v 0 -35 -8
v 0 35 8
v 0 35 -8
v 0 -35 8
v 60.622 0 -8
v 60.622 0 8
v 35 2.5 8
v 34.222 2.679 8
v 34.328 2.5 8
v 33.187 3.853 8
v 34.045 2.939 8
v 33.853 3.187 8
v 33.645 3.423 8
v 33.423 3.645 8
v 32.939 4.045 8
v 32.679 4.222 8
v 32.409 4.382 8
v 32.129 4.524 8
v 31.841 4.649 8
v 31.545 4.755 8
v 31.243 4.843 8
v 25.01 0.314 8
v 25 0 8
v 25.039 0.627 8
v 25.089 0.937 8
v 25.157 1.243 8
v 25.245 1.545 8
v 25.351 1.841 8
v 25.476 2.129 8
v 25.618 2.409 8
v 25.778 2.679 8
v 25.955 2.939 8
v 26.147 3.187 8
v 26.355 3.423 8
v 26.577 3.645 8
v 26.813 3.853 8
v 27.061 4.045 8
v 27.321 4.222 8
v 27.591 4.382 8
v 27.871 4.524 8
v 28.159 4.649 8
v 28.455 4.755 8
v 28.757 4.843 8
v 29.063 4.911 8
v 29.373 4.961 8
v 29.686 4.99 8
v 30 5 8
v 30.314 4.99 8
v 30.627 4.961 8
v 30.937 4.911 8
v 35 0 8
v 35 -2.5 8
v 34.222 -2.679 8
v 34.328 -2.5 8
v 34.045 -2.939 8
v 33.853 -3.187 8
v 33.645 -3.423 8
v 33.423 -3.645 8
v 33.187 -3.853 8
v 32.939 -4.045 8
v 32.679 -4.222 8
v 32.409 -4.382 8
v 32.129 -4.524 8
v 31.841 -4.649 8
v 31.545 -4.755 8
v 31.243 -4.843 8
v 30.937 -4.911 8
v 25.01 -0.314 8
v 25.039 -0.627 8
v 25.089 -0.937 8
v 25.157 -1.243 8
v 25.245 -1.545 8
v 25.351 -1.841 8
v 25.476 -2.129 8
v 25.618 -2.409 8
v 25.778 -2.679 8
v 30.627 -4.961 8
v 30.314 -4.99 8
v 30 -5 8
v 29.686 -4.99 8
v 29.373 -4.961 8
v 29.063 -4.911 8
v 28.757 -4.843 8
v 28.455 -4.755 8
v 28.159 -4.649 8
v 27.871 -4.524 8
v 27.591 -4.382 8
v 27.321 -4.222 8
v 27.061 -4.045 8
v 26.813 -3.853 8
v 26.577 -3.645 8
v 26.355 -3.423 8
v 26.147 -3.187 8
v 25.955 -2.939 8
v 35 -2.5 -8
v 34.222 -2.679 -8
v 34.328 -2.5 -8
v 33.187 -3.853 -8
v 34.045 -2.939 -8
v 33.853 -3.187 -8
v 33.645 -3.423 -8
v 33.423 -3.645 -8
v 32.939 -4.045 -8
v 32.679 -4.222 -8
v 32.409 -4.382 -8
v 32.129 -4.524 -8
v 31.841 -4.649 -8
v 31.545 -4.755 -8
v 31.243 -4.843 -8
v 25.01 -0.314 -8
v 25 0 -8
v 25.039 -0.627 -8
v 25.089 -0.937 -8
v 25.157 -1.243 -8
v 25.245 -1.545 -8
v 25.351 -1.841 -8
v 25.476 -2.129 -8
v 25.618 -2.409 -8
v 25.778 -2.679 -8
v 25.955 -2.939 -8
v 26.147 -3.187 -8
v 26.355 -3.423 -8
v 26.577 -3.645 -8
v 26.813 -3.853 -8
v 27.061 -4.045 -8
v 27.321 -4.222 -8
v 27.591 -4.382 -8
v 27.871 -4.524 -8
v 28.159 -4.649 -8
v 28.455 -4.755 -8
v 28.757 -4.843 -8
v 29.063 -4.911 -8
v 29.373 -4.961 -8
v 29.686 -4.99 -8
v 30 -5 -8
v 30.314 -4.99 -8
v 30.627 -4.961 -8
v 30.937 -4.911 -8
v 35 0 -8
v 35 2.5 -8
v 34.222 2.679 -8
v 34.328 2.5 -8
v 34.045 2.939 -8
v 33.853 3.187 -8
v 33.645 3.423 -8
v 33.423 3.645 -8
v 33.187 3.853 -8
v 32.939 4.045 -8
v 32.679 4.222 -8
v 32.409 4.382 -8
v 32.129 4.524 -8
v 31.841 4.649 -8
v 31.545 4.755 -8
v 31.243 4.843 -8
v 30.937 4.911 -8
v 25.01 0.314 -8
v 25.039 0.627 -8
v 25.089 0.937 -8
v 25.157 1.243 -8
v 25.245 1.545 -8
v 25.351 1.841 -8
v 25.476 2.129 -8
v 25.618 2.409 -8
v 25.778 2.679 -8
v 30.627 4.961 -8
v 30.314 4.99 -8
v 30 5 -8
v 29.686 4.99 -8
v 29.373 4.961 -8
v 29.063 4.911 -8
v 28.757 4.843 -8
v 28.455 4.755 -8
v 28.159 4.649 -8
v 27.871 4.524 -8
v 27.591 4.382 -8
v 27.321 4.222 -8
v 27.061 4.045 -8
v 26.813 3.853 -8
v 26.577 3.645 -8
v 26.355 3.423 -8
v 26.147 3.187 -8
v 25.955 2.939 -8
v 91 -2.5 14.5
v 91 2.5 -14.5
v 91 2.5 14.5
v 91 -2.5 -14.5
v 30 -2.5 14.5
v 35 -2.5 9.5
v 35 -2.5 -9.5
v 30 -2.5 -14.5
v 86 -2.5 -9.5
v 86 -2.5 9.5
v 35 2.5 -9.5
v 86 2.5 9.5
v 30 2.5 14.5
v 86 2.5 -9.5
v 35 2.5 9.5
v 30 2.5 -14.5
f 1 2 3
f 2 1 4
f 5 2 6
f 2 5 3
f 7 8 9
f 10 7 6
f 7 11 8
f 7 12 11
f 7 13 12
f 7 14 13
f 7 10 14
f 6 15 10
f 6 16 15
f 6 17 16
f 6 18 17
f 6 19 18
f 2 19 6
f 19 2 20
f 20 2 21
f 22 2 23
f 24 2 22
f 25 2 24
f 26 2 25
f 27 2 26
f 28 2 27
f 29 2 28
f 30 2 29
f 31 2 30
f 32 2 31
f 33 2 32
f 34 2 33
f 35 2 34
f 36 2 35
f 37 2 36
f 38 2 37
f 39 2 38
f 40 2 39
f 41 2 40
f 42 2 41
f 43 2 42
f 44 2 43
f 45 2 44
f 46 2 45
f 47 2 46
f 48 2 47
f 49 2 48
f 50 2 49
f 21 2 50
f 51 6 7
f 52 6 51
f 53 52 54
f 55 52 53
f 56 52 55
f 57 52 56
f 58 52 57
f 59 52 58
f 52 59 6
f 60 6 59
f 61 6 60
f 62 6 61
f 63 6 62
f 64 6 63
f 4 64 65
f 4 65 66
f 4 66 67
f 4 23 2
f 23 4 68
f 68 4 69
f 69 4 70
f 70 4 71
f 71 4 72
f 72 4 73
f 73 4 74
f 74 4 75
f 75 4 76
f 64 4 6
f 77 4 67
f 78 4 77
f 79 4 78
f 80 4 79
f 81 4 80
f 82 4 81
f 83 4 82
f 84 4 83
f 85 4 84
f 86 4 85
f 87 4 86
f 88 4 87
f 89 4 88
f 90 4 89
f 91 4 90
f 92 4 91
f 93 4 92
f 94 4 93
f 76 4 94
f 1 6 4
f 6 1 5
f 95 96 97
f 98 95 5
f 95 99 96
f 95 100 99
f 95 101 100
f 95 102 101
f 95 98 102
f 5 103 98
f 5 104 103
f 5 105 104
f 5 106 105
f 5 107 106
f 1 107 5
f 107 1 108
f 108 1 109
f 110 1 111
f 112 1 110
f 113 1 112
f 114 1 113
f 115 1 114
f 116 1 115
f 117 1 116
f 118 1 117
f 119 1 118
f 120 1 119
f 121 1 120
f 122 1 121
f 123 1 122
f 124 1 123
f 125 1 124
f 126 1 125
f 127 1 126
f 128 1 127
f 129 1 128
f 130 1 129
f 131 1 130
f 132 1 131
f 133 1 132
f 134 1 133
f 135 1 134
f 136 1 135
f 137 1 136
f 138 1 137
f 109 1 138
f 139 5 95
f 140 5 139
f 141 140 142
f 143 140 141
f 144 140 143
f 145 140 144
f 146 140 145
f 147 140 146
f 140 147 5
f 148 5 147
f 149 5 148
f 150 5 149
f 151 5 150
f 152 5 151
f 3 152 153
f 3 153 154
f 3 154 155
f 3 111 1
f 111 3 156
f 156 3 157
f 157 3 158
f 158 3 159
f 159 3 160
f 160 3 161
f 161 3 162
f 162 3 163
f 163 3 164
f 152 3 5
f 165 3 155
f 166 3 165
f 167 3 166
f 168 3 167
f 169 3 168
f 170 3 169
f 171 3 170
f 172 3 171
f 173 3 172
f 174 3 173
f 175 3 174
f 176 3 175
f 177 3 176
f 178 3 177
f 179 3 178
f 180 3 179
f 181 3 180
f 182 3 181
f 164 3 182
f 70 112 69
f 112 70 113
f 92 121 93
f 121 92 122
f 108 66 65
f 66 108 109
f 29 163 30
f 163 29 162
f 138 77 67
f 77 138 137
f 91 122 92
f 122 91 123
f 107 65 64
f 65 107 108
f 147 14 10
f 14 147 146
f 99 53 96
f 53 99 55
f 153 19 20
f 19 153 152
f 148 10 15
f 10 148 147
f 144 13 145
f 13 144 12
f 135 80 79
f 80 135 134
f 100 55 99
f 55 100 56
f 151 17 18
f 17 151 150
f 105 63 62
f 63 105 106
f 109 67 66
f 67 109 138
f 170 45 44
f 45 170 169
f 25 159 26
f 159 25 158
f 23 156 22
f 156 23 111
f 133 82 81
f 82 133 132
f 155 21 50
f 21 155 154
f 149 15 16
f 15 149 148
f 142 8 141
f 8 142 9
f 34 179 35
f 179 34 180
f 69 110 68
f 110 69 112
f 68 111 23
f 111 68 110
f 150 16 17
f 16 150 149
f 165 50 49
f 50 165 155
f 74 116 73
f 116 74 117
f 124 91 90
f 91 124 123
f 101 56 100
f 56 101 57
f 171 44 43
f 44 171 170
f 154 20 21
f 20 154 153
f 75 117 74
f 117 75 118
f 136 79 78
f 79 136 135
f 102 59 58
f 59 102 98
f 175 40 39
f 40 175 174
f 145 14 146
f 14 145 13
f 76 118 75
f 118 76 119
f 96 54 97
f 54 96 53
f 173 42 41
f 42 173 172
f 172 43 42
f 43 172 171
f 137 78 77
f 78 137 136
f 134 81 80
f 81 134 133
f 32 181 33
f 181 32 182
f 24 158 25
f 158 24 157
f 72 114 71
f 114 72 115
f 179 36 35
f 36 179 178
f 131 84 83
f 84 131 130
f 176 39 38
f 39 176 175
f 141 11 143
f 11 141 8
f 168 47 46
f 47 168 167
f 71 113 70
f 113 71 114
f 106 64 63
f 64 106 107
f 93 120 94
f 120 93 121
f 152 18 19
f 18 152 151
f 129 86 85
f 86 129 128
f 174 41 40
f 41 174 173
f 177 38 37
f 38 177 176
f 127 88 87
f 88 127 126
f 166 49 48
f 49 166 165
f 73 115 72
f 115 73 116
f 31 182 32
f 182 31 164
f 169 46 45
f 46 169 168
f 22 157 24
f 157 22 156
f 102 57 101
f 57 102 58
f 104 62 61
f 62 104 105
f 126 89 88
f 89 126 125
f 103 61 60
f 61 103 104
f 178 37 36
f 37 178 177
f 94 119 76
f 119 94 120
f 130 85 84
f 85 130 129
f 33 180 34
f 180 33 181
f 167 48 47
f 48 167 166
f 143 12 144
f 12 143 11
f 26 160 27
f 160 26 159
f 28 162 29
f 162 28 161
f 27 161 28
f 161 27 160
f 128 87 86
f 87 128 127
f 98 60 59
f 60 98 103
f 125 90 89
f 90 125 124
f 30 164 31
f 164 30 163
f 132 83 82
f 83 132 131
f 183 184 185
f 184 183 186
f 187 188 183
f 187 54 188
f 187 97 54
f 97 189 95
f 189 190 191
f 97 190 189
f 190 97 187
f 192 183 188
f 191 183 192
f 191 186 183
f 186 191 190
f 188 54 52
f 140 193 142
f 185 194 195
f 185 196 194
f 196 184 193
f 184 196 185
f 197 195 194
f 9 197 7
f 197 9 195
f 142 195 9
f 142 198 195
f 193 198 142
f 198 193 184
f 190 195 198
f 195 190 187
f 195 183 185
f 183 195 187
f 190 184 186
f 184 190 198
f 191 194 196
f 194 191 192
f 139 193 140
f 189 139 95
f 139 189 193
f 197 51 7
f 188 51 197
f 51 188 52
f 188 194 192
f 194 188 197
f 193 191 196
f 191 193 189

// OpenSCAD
hooks();

module hooks(){

$fn=100;

difference(){

translate([(70/2)*tan(30),0,0]){
 
cylinder(16,(70/2)/cos(30),(70/2)/cos(30),$fn=3,center=true);

    }
    
    
    translate([30,0,0]){
cylinder(40,d=10,center=true);}



}

translate([61/2+30,0,0])
rotate([90,0,0])
{
    difference(){
cube([61,29,5],center=true);
cube([51,19,15],center=true);    
    }
}}
